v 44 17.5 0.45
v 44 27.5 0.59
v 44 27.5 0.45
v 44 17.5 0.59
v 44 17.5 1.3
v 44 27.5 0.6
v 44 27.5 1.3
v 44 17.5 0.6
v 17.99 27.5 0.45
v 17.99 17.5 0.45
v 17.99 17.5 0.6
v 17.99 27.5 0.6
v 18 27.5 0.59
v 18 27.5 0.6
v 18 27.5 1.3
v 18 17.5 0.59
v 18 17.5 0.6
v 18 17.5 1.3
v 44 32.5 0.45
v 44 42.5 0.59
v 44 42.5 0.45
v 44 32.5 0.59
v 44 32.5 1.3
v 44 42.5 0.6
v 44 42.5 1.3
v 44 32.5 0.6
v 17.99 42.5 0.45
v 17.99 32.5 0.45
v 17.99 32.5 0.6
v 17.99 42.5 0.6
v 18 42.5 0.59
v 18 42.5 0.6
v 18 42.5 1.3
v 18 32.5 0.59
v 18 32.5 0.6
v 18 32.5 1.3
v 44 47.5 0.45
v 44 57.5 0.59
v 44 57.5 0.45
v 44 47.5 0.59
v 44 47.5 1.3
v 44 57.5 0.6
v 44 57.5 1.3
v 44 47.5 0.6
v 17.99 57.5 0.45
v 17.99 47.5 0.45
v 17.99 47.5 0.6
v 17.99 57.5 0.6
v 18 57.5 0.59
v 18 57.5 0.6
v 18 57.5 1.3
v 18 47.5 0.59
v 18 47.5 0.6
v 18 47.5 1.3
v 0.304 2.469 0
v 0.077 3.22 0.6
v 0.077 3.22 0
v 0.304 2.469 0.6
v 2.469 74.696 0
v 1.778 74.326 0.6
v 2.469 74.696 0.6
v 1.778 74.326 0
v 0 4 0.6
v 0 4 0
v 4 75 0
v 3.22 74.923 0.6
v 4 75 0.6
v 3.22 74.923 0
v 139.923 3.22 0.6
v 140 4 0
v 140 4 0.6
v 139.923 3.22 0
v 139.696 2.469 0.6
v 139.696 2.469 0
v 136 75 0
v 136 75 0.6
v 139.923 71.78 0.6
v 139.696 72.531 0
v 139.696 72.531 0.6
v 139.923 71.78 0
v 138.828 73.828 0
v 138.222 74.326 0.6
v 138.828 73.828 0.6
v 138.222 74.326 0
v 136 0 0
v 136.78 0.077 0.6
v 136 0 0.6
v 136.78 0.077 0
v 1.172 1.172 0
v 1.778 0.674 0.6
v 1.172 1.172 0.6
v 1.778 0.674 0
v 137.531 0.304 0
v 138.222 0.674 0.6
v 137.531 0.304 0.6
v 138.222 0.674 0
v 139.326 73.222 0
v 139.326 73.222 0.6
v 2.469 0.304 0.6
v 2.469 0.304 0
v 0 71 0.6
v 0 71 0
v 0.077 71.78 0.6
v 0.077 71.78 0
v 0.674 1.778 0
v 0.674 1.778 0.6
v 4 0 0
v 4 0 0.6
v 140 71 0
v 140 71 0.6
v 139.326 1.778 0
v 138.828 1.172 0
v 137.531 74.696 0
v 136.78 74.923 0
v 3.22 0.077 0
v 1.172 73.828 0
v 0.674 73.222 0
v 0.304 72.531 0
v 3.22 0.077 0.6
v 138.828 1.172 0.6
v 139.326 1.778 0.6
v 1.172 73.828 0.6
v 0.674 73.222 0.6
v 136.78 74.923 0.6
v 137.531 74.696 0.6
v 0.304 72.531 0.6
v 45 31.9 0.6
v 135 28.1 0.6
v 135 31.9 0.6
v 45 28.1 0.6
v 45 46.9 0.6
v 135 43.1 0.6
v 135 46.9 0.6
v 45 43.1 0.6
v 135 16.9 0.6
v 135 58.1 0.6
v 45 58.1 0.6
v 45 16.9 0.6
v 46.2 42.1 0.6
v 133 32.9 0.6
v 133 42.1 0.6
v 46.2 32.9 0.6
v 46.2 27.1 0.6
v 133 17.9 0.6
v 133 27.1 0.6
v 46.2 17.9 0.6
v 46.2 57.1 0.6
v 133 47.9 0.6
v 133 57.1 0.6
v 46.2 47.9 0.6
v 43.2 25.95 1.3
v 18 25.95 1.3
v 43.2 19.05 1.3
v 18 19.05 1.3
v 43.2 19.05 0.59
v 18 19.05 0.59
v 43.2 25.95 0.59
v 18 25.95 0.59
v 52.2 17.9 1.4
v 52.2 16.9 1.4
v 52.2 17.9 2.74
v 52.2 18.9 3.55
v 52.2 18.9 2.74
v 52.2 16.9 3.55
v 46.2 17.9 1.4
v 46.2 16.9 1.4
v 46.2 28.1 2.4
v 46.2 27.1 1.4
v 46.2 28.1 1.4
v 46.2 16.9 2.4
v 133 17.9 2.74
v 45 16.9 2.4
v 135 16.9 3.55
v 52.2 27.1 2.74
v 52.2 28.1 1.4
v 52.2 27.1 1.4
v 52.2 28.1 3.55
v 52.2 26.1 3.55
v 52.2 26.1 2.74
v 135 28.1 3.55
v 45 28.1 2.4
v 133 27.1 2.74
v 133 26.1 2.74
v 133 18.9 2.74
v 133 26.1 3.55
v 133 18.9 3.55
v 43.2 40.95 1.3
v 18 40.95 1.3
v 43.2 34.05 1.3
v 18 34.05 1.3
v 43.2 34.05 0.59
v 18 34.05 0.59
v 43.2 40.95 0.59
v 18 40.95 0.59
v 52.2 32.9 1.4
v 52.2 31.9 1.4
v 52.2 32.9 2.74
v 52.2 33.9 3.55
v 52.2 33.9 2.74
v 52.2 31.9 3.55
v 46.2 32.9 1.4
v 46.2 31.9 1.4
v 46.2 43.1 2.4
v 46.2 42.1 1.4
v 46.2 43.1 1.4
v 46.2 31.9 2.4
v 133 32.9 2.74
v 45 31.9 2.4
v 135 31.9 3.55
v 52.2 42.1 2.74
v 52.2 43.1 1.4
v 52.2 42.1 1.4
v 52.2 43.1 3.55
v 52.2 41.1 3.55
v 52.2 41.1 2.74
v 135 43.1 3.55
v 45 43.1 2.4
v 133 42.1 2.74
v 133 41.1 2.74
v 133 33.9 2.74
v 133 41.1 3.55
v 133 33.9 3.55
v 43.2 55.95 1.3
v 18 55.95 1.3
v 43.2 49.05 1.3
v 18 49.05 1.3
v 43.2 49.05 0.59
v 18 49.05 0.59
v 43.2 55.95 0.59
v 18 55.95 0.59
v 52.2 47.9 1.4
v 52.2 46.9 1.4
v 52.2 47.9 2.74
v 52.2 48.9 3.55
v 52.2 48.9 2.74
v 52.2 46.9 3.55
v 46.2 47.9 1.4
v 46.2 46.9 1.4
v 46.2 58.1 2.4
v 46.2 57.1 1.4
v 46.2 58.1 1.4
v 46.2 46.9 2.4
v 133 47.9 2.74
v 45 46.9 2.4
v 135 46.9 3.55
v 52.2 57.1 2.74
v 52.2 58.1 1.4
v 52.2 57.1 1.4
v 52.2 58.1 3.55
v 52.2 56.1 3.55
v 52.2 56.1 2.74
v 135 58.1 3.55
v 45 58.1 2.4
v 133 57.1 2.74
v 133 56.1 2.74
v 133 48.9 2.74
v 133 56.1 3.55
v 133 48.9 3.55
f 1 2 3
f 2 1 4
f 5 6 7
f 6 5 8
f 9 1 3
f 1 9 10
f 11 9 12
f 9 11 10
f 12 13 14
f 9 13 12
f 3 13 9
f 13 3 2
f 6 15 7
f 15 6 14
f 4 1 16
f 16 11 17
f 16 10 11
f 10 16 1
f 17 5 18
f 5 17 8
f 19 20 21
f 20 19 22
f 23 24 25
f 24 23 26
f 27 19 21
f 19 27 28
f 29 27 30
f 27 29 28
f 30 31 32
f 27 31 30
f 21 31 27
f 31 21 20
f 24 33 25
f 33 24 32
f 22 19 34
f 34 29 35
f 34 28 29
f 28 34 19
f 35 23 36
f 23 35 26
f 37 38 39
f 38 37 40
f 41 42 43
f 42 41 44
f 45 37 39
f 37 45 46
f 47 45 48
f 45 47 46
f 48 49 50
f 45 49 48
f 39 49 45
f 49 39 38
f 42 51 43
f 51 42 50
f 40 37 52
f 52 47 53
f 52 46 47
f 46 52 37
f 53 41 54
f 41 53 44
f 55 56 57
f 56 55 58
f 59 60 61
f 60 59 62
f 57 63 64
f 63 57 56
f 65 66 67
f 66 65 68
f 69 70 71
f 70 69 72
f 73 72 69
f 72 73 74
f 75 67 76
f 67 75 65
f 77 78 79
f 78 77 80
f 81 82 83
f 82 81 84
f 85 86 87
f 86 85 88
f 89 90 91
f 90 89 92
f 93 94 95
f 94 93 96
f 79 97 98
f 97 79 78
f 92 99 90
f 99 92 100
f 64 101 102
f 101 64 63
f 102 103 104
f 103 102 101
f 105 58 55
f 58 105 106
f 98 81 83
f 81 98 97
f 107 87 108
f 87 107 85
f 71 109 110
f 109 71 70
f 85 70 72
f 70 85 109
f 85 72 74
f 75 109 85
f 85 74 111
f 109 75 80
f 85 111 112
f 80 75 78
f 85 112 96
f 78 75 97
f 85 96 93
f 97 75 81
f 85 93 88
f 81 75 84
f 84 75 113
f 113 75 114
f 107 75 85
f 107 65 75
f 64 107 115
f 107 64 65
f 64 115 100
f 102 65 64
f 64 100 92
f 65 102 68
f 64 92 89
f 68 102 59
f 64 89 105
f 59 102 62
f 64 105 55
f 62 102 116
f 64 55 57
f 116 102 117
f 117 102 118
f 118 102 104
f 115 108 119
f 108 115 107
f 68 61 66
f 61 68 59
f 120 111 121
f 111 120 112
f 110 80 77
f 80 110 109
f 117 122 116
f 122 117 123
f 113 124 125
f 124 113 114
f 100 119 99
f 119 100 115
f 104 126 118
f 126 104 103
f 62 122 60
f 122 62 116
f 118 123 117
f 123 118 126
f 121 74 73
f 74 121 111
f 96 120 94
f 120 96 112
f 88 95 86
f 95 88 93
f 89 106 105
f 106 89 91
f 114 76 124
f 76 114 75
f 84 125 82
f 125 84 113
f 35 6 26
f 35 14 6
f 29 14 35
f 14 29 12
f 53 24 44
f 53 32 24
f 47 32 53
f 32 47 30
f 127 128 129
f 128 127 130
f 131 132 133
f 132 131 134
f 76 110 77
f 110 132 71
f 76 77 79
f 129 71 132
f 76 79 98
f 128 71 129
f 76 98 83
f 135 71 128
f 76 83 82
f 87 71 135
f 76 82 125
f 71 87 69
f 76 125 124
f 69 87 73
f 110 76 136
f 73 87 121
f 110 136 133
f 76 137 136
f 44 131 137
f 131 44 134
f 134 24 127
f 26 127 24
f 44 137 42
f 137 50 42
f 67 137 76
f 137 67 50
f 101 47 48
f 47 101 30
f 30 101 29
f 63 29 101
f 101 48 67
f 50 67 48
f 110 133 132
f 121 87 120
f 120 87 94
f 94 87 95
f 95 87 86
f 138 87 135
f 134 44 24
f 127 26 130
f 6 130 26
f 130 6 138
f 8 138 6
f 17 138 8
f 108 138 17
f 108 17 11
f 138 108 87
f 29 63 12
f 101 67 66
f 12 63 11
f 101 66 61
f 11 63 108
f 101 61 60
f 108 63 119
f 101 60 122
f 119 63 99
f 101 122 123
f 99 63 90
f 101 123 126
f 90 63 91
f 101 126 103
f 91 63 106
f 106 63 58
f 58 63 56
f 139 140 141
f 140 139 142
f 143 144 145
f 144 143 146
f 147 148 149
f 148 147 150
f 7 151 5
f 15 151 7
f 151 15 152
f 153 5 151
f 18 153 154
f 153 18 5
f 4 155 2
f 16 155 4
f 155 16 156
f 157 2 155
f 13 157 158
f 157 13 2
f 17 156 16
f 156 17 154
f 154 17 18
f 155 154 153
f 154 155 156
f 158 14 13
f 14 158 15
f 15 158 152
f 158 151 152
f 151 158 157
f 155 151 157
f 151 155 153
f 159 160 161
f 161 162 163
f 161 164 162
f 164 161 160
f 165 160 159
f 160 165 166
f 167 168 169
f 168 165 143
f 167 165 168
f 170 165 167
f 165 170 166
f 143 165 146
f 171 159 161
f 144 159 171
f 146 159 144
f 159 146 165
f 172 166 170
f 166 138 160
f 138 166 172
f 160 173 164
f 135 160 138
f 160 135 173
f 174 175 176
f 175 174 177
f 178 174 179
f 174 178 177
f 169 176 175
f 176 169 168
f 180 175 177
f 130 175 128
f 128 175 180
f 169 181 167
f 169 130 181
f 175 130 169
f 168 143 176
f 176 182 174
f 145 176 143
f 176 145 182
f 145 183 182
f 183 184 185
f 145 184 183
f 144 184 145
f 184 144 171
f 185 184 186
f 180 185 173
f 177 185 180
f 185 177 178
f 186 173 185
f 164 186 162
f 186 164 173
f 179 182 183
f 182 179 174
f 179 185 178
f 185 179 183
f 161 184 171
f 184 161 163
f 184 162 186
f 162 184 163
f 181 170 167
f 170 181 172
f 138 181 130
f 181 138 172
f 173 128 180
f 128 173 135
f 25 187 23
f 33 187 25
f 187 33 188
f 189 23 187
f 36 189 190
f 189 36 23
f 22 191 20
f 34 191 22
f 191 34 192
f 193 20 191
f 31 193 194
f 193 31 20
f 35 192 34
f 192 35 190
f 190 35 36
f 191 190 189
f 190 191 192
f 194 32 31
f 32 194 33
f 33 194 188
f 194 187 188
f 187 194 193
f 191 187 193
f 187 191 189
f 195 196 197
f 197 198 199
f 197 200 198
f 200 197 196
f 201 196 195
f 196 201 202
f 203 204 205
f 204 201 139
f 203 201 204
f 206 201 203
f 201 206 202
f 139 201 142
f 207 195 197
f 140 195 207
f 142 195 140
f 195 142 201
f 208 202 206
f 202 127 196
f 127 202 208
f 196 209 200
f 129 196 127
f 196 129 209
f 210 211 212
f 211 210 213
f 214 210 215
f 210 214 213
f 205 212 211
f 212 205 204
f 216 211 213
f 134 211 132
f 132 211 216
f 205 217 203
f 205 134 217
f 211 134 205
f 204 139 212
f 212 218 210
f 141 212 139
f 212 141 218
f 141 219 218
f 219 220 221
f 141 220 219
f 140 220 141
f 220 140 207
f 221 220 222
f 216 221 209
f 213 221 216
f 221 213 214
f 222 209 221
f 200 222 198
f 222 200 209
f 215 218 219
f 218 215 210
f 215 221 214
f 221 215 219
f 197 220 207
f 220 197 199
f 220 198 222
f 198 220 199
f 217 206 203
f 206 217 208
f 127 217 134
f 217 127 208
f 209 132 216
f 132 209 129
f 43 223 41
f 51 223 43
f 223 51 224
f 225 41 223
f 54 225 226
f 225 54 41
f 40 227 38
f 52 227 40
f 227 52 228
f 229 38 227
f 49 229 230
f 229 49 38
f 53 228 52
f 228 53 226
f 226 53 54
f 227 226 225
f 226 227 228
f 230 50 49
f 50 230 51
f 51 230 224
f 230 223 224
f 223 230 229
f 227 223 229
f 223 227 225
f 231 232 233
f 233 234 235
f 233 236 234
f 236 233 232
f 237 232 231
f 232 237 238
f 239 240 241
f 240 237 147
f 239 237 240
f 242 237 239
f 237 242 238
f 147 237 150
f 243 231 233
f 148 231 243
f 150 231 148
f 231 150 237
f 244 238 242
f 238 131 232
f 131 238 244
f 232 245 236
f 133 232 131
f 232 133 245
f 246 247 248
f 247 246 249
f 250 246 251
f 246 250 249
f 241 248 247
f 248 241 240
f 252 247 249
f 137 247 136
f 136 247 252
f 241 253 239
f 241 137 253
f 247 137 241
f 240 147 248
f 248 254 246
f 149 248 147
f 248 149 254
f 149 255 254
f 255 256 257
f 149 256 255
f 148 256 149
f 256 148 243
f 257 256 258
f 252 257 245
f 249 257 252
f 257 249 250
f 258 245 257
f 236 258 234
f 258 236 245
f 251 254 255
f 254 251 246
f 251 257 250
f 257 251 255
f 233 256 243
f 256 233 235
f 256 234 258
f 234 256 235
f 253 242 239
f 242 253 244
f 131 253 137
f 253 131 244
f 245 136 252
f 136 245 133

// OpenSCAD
// file: params.scad
// 0603 编带收纳页 v1 参数
// 单位：mm；默认按 B5 纵向页面、PETG、0.4 mm 喷嘴、平放无支撑打印。

// 页面：ISO B5 纵向比例
page_width = 176;
page_height = 250;
// 极薄底板：按 0.2 mm 层高约 3 层设计；优先减薄，必须先做翘曲实测。
base_thickness = 0.6;
corner_radius = 4;

// B5 常见 26 孔活页制式；内容区从孔列右侧开始。
// 26 孔、9.5 mm 孔距、约 5.5 mm 圆孔，孔中心距左边约 6.5 mm。
binding_holes_enabled = true;
binding_hole_count = 26;
binding_hole_pitch = 9.5;
binding_hole_diameter = 5.5;
binding_hole_center_x = 6.5;
binding_margin = 18;

// 标签与滑道布局
lane_count = 15;
lane_pitch = 15;
label_width = 25;
label_height = 9;
label_clearance = 0.5;
label_recess_depth = 0.15;
label_frame_thickness = 0.8;
label_lip_inset = 0.75;
label_lip_height = 0.7;
// 标签槽结束后只留 1 mm 的结构间隙，标签直接贴近对应滑道入口。
label_column_width = 26;
track_gap_after_label = 1;
right_edge_margin = 5;

// 8 mm 压纹塑料载带的初始包络；拿到实物后只需调整这些参数。
tape_width = 8;
tape_height = 1.8;
tape_side_clearance = 0.6;
top_clearance = 0.35;

// 限位结构
rail_stem_width = 1.0;
// 每侧向内压住编带 1.0 mm；顶部有效开口约为 7.2 mm。
rail_cap_overlap = 1.0;
rail_cap_thickness = 0.8;
entry_stop_thickness = 1.2;
// 横挡后保留 6 mm 装入/取料窗口；T 形压边从其后立即开始。
entry_notch_length = 6.0;
entry_zone_length = entry_stop_thickness + entry_notch_length;
// 左端挡板不再高出载带包络，便于将带头压入窗口后向右推。
entry_stop_height = 1.8;
end_stop_thickness = 2.0;
entry_guide_height = 0.8;
single_hook_guide_height = 0.9;

// 运行根文件时的默认模型；测试片通过独立 wrapper 调用。
model_selector = "page";
rail_profile = "dual_t";
// file: 0603_tape_page.scad
// 0603 编带收纳活页页 v1
//
// 机械契约：
// - FDM / PETG；页面平放，底面贴打印平台，设计目标为无支撑打印。
// - 页面没有分型面、螺钉或密封件；编带从每条滑道左端的开放装入窗口放入。
// - 双侧 T 形限位覆盖编带两侧边缘；入口横挡防止编带自行滑回，右端止挡防止冲出。
// - 载带尺寸为可调包络，默认按 8 mm 压纹塑料带的保守初值建模。

include <params.scad>;

eps = 0.01;
$fn = 32;

function channel_clear_width() = tape_width + 2 * tape_side_clearance;
function lane_outer_width() = channel_clear_width() + 2 * rail_stem_width;
function rail_stem_height() = tape_height + top_clearance;
function rail_total_height() = rail_stem_height() + rail_cap_thickness;
function track_start_x() = binding_margin + label_column_width + track_gap_after_label;
function track_end_x(page_w = page_width) = page_w - right_edge_margin;
function row_center(index, page_h = page_height, count = lane_count, pitch = lane_pitch) =
    (page_h - (count - 1) * pitch) / 2 + index * pitch;
function binding_hole_y(index, page_h = page_height, count = binding_hole_count, pitch = binding_hole_pitch) =
    (page_h - (count - 1) * pitch) / 2 + index * pitch;

module rounded_plate(w, h, r, z) {
    linear_extrude(height = z)
        hull() {
            translate([r, r]) circle(r = r);
            translate([w - r, r]) circle(r = r);
            translate([w - r, h - r]) circle(r = r);
            translate([r, h - r]) circle(r = r);
        }
}

module label_recess_cut(
    cy,
    x0 = binding_margin,
    base_t = base_thickness,
    label_w = label_width,
    label_h = label_height,
    label_clear = label_clearance,
    recess_depth = label_recess_depth
) {
    pocket_w = label_w + 2 * label_clear;
    pocket_h = label_h + 2 * label_clear;

    // 从页面左边缘开口，底部仍然保留，不形成穿透孔。
    translate([x0 - eps, cy - pocket_h / 2, base_t - recess_depth])
        cube([pocket_w + eps, pocket_h, recess_depth + 2 * eps]);
}

module label_frame(
    cy,
    x0 = binding_margin,
    base_t = base_thickness,
    label_w = label_width,
    label_h = label_height,
    label_clear = label_clearance,
    frame_t = label_frame_thickness,
    lip_inset = label_lip_inset,
    lip_h = label_lip_height
) {
    pocket_w = label_w + 2 * label_clear;
    pocket_h = label_h + 2 * label_clear;
    frame_depth = frame_t + lip_inset;
    y0 = cy - pocket_h / 2;

    // 左端开放，纸片从页面外侧滑入；上下边缘向内压住纸片。
    // 轻微穿入底板，避免导出 STL 时形成共面接触边。
    translate([x0, y0, base_t - eps])
        cube([pocket_w, frame_depth, lip_h + eps]);
    translate([x0, y0 + pocket_h - frame_depth, base_t - eps])
        cube([pocket_w, frame_depth, lip_h + eps]);
    translate([x0 + pocket_w - frame_t, y0, base_t - eps])
        cube([frame_t, pocket_h, lip_h + eps]);
}

module lane(
    x0,
    x1,
    cy,
    profile = "dual_t",
    base_t = base_thickness,
    tape_h = tape_height,
    tape_side_clear = tape_side_clearance,
    top_clear = top_clearance,
    stem_w = rail_stem_width,
    cap_overlap = rail_cap_overlap,
    cap_t = rail_cap_thickness,
    entry_len = entry_zone_length,
    entry_stop_t = entry_stop_thickness,
    entry_stop_h = entry_stop_height,
    end_stop_t = end_stop_thickness
) {
    clear_w = tape_width + 2 * tape_side_clear;
    outer_w = clear_w + 2 * stem_w;
    y0 = cy - outer_w / 2;
    y1 = y0 + outer_w - stem_w;
    stem_h = tape_h + top_clear;
    total_h = stem_h + cap_t;
    cap_start = x0 + entry_len;
    cap_end = x1 - end_stop_t;
    rail_len = max(0, cap_end - cap_start);
    entry_len_actual = max(0, entry_len - entry_stop_t);

    // 左端低横挡：编带从上方放入入口窗口，装入后不会轻易向左滑出。
    translate([x0, y0, base_t - eps])
        cube([entry_stop_t, outer_w, entry_stop_h + eps]);

    // 入口窗口的低导向边，保留顶部空间作为镊子操作豁口。
    if (entry_len_actual > 0) {
        translate([x0 + entry_stop_t, y0, base_t - eps])
            cube([entry_len_actual, stem_w, entry_guide_height + eps]);
        translate([x0 + entry_stop_t, y1, base_t - eps])
            cube([entry_len_actual, stem_w, entry_guide_height + eps]);
    }

    if (rail_len > 0) {
        // 下侧导轨：双 T 和单 7 都保留这一侧的上压边。
        translate([cap_start, y0, base_t - eps])
            cube([rail_len, stem_w, stem_h + eps]);
        translate([cap_start, y0, base_t + stem_h - eps])
            cube([rail_len, stem_w + cap_overlap, cap_t + eps]);

        // 上侧导轨：dual_t 为完整 T；single_7 只保留低导向边。
        if (profile == "dual_t") {
            translate([cap_start, y1, base_t - eps])
                cube([rail_len, stem_w, stem_h + eps]);
            translate([cap_start, y1 - cap_overlap, base_t + stem_h - eps])
                cube([rail_len, stem_w + cap_overlap, cap_t + eps]);
        } else {
            translate([cap_start, y1, base_t - eps])
                cube([rail_len, stem_w, single_hook_guide_height + eps]);
        }
    }

    // 右端止挡与导轨连接，防止编带向前冲出。
    translate([x1 - end_stop_t, y0, base_t - eps])
        cube([end_stop_t, outer_w, total_h + eps]);
}

module base_with_label_recess(
    w,
    h,
    base_t,
    radius,
    count,
    pitch,
    add_binding_holes = false
) {
    difference() {
        rounded_plate(w, h, radius, base_t);

        if (add_binding_holes) {
            for (i = [0 : binding_hole_count - 1]) {
                translate([
                    binding_hole_center_x,
                    binding_hole_y(i, h),
                    -eps
                ])
                    cylinder(
                        h = base_t + 2 * eps,
                        d = binding_hole_diameter
                    );
            }
        }

        for (i = [0 : count - 1]) {
            label_recess_cut(
                row_center(i, h, count, pitch),
                base_t = base_t
            );
        }
    }
}

module page_0603() {
    x0 = track_start_x();
    x1 = track_end_x(page_width);

    union() {
        base_with_label_recess(
            page_width,
            page_height,
            base_thickness,
            corner_radius,
            lane_count,
            lane_pitch,
            add_binding_holes = binding_holes_enabled
        );

        for (i = [0 : lane_count - 1]) {
            cy = row_center(i);
            label_frame(cy);
            lane(x0, x1, cy, profile = rail_profile);
        }
    }
}

module fit_coupon(profile = "dual_t") {
    coupon_w = 140;
    coupon_h = 75;
    coupon_count = 3;
    coupon_pitch = 15;
    // 测试片也必须沿用页面的标签列结束位置，避免滑道压到标签槽。
    coupon_x0 = track_start_x();
    coupon_x1 = coupon_w - 5;

    union() {
        base_with_label_recess(
            coupon_w,
            coupon_h,
            base_thickness,
            corner_radius,
            coupon_count,
            coupon_pitch,
            add_binding_holes = false
        );

        for (i = [0 : coupon_count - 1]) {
            cy = row_center(i, coupon_h, coupon_count, coupon_pitch);
            label_frame(cy);
            lane(coupon_x0, coupon_x1, cy, profile = profile);
        }
    }
}

// 根文件默认生成完整 B5 页面；测试片使用独立 wrapper，便于分别导出。
if (model_selector == "page") {
    page_0603();
} else if (model_selector == "fit_dual_t") {
    fit_coupon("dual_t");
} else if (model_selector == "fit_single_7") {
    fit_coupon("single_7");
}
// main file
// 双侧 T 形限位测试片
use <0603_tape_page.scad>;

fit_coupon("dual_t");
